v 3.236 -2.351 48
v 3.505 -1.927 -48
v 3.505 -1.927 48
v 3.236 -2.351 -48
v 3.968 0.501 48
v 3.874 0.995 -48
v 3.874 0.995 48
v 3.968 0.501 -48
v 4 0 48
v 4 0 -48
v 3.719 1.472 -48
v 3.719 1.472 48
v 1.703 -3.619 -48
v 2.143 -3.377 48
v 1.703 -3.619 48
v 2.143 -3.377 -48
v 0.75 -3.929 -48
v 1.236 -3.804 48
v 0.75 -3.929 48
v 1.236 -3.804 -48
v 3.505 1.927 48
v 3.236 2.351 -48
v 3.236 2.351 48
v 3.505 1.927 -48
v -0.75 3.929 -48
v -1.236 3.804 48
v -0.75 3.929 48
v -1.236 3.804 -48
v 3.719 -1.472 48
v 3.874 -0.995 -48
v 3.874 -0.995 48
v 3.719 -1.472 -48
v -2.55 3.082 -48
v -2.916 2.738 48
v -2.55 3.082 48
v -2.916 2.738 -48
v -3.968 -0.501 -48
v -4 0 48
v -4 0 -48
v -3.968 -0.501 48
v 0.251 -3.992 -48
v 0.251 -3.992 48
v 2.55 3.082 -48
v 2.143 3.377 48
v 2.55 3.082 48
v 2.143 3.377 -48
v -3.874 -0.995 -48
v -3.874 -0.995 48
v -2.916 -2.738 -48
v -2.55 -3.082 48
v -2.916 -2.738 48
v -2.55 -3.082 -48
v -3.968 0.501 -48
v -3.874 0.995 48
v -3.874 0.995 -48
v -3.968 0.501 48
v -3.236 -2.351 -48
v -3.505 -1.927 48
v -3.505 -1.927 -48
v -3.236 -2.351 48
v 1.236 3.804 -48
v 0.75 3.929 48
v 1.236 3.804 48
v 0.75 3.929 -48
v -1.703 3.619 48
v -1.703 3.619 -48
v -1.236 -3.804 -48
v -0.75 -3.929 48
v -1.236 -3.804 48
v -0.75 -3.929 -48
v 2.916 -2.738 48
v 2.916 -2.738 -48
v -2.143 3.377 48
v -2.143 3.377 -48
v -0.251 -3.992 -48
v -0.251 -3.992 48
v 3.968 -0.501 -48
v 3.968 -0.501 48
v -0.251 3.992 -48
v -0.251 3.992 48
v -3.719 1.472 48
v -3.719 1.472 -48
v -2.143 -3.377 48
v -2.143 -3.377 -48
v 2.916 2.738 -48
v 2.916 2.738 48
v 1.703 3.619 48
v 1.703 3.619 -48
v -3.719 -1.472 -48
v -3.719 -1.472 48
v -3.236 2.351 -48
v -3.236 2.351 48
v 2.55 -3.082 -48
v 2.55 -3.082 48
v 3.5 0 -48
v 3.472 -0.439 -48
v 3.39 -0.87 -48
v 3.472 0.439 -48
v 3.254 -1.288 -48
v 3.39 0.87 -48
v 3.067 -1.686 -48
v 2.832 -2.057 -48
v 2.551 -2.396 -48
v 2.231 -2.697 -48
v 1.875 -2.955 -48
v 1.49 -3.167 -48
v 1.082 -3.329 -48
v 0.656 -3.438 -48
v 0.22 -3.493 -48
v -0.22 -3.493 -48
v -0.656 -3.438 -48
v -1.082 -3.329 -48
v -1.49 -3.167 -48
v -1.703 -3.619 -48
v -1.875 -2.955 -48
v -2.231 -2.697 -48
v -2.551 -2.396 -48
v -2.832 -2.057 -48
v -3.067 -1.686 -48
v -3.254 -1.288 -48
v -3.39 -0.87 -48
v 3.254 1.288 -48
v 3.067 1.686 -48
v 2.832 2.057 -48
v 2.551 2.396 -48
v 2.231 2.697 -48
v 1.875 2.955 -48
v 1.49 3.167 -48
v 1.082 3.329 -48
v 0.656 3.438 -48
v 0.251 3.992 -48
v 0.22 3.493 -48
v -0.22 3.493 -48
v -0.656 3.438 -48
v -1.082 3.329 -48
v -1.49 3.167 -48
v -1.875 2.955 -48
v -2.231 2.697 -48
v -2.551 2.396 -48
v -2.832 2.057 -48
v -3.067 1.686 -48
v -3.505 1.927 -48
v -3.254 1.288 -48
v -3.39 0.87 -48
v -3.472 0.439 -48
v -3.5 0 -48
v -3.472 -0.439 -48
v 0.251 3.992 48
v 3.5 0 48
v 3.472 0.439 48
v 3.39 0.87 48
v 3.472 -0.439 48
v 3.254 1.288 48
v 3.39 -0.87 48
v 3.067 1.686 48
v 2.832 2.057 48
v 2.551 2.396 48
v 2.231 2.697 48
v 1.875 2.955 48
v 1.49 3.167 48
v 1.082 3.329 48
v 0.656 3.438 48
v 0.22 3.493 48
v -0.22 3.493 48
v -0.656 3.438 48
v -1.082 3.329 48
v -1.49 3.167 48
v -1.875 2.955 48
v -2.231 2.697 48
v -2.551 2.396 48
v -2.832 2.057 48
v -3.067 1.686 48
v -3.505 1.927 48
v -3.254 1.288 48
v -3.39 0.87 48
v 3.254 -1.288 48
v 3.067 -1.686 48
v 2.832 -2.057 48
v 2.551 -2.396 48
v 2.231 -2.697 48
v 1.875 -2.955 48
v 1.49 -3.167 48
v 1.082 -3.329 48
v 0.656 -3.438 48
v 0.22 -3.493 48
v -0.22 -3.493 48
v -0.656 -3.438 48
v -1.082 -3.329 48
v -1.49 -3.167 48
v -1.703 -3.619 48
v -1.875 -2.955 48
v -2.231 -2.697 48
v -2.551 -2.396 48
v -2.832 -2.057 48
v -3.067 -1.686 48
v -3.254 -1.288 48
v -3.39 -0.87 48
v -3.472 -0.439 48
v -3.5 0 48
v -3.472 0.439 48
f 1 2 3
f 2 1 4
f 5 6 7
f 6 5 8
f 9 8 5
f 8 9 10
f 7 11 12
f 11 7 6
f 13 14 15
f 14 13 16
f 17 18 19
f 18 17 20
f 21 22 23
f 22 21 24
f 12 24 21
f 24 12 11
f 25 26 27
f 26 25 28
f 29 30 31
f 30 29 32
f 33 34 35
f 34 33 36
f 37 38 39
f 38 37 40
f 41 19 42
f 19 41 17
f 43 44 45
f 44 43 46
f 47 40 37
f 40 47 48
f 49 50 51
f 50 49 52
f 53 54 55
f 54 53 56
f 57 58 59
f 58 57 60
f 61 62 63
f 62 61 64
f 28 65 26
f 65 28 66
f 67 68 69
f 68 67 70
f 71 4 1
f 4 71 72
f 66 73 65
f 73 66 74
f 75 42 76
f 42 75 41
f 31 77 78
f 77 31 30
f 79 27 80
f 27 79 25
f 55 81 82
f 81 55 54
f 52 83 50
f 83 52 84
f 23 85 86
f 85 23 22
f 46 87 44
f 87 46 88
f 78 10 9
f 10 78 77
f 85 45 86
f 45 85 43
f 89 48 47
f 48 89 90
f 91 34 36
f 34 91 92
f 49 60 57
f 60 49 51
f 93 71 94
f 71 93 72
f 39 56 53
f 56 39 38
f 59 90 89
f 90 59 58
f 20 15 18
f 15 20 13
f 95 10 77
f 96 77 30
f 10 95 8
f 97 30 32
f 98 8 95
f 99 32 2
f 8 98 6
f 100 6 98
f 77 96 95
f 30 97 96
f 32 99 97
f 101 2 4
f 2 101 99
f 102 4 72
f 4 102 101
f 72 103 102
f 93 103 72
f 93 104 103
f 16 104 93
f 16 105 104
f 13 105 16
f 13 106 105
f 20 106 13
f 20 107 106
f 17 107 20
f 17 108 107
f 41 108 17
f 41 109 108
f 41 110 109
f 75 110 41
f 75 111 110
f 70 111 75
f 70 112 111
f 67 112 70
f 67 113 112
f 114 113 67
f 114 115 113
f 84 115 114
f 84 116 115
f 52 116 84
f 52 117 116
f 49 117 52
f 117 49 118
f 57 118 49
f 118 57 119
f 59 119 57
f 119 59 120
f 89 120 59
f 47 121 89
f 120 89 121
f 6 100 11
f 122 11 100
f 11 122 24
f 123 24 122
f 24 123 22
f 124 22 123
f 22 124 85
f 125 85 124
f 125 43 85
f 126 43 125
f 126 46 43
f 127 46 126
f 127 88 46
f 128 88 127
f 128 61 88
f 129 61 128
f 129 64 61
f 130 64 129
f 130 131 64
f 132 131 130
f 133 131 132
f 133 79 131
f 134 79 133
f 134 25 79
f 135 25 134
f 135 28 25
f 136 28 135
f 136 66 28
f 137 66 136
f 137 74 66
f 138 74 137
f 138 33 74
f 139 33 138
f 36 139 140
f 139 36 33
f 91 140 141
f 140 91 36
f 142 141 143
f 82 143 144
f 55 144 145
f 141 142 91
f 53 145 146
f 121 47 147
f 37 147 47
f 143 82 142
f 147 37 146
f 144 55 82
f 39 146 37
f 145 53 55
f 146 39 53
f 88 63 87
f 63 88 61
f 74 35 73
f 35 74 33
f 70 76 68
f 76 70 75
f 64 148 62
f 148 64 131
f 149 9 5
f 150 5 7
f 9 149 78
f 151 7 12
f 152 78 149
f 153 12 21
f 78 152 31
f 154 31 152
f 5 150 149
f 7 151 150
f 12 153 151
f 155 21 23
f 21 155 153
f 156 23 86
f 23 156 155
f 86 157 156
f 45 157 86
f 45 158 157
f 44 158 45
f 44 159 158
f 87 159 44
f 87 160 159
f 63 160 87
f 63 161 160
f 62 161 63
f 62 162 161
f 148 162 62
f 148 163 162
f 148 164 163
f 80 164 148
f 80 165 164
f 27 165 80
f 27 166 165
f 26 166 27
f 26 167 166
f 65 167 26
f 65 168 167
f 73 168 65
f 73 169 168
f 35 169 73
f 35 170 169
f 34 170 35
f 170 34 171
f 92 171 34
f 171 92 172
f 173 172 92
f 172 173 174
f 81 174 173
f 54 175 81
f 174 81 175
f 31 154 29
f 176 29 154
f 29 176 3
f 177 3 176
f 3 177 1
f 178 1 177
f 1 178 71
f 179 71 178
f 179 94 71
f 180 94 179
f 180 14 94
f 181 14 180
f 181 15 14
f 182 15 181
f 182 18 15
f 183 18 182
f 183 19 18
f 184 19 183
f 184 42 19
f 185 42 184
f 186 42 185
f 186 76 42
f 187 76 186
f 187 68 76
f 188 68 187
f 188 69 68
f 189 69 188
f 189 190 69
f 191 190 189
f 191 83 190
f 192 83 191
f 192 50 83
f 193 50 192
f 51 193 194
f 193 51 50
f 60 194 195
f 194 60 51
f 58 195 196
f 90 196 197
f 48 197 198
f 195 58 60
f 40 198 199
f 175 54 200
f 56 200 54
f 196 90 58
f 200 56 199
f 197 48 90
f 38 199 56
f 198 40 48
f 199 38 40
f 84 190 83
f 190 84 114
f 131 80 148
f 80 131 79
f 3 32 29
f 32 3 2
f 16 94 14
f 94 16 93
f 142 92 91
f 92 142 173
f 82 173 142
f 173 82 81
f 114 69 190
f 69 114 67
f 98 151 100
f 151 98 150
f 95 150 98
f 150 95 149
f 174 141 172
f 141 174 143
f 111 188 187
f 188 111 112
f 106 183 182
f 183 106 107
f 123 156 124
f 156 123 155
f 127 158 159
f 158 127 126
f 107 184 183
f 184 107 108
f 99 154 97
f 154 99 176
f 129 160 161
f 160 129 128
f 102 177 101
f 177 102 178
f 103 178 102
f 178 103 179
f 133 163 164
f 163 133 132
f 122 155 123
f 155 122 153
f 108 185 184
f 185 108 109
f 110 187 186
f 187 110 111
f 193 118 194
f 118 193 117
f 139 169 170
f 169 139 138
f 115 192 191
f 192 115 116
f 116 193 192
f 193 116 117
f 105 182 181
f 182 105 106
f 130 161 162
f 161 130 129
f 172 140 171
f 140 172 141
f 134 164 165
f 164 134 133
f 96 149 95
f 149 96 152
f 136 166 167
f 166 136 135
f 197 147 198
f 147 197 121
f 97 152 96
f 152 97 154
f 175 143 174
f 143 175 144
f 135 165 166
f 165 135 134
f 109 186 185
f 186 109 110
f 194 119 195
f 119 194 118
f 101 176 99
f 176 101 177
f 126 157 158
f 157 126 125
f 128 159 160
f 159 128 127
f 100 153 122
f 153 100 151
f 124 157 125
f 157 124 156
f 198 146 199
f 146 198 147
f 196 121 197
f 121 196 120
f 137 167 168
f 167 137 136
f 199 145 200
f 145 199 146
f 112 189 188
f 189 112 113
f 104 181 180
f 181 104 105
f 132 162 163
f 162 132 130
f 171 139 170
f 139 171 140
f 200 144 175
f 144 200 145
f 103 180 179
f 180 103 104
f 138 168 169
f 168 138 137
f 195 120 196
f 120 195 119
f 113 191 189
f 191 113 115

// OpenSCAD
$fn = 50;


difference() {
	union() {
		translate(v = [0, 0, -48.0000000000]) {
			cylinder(h = 96, r = 4.0000000000);
		}
	}
	union() {
		translate(v = [0, 0, -100.0000000000]) {
			cylinder(h = 200, r = 3.5000000000);
		}
	}
}
